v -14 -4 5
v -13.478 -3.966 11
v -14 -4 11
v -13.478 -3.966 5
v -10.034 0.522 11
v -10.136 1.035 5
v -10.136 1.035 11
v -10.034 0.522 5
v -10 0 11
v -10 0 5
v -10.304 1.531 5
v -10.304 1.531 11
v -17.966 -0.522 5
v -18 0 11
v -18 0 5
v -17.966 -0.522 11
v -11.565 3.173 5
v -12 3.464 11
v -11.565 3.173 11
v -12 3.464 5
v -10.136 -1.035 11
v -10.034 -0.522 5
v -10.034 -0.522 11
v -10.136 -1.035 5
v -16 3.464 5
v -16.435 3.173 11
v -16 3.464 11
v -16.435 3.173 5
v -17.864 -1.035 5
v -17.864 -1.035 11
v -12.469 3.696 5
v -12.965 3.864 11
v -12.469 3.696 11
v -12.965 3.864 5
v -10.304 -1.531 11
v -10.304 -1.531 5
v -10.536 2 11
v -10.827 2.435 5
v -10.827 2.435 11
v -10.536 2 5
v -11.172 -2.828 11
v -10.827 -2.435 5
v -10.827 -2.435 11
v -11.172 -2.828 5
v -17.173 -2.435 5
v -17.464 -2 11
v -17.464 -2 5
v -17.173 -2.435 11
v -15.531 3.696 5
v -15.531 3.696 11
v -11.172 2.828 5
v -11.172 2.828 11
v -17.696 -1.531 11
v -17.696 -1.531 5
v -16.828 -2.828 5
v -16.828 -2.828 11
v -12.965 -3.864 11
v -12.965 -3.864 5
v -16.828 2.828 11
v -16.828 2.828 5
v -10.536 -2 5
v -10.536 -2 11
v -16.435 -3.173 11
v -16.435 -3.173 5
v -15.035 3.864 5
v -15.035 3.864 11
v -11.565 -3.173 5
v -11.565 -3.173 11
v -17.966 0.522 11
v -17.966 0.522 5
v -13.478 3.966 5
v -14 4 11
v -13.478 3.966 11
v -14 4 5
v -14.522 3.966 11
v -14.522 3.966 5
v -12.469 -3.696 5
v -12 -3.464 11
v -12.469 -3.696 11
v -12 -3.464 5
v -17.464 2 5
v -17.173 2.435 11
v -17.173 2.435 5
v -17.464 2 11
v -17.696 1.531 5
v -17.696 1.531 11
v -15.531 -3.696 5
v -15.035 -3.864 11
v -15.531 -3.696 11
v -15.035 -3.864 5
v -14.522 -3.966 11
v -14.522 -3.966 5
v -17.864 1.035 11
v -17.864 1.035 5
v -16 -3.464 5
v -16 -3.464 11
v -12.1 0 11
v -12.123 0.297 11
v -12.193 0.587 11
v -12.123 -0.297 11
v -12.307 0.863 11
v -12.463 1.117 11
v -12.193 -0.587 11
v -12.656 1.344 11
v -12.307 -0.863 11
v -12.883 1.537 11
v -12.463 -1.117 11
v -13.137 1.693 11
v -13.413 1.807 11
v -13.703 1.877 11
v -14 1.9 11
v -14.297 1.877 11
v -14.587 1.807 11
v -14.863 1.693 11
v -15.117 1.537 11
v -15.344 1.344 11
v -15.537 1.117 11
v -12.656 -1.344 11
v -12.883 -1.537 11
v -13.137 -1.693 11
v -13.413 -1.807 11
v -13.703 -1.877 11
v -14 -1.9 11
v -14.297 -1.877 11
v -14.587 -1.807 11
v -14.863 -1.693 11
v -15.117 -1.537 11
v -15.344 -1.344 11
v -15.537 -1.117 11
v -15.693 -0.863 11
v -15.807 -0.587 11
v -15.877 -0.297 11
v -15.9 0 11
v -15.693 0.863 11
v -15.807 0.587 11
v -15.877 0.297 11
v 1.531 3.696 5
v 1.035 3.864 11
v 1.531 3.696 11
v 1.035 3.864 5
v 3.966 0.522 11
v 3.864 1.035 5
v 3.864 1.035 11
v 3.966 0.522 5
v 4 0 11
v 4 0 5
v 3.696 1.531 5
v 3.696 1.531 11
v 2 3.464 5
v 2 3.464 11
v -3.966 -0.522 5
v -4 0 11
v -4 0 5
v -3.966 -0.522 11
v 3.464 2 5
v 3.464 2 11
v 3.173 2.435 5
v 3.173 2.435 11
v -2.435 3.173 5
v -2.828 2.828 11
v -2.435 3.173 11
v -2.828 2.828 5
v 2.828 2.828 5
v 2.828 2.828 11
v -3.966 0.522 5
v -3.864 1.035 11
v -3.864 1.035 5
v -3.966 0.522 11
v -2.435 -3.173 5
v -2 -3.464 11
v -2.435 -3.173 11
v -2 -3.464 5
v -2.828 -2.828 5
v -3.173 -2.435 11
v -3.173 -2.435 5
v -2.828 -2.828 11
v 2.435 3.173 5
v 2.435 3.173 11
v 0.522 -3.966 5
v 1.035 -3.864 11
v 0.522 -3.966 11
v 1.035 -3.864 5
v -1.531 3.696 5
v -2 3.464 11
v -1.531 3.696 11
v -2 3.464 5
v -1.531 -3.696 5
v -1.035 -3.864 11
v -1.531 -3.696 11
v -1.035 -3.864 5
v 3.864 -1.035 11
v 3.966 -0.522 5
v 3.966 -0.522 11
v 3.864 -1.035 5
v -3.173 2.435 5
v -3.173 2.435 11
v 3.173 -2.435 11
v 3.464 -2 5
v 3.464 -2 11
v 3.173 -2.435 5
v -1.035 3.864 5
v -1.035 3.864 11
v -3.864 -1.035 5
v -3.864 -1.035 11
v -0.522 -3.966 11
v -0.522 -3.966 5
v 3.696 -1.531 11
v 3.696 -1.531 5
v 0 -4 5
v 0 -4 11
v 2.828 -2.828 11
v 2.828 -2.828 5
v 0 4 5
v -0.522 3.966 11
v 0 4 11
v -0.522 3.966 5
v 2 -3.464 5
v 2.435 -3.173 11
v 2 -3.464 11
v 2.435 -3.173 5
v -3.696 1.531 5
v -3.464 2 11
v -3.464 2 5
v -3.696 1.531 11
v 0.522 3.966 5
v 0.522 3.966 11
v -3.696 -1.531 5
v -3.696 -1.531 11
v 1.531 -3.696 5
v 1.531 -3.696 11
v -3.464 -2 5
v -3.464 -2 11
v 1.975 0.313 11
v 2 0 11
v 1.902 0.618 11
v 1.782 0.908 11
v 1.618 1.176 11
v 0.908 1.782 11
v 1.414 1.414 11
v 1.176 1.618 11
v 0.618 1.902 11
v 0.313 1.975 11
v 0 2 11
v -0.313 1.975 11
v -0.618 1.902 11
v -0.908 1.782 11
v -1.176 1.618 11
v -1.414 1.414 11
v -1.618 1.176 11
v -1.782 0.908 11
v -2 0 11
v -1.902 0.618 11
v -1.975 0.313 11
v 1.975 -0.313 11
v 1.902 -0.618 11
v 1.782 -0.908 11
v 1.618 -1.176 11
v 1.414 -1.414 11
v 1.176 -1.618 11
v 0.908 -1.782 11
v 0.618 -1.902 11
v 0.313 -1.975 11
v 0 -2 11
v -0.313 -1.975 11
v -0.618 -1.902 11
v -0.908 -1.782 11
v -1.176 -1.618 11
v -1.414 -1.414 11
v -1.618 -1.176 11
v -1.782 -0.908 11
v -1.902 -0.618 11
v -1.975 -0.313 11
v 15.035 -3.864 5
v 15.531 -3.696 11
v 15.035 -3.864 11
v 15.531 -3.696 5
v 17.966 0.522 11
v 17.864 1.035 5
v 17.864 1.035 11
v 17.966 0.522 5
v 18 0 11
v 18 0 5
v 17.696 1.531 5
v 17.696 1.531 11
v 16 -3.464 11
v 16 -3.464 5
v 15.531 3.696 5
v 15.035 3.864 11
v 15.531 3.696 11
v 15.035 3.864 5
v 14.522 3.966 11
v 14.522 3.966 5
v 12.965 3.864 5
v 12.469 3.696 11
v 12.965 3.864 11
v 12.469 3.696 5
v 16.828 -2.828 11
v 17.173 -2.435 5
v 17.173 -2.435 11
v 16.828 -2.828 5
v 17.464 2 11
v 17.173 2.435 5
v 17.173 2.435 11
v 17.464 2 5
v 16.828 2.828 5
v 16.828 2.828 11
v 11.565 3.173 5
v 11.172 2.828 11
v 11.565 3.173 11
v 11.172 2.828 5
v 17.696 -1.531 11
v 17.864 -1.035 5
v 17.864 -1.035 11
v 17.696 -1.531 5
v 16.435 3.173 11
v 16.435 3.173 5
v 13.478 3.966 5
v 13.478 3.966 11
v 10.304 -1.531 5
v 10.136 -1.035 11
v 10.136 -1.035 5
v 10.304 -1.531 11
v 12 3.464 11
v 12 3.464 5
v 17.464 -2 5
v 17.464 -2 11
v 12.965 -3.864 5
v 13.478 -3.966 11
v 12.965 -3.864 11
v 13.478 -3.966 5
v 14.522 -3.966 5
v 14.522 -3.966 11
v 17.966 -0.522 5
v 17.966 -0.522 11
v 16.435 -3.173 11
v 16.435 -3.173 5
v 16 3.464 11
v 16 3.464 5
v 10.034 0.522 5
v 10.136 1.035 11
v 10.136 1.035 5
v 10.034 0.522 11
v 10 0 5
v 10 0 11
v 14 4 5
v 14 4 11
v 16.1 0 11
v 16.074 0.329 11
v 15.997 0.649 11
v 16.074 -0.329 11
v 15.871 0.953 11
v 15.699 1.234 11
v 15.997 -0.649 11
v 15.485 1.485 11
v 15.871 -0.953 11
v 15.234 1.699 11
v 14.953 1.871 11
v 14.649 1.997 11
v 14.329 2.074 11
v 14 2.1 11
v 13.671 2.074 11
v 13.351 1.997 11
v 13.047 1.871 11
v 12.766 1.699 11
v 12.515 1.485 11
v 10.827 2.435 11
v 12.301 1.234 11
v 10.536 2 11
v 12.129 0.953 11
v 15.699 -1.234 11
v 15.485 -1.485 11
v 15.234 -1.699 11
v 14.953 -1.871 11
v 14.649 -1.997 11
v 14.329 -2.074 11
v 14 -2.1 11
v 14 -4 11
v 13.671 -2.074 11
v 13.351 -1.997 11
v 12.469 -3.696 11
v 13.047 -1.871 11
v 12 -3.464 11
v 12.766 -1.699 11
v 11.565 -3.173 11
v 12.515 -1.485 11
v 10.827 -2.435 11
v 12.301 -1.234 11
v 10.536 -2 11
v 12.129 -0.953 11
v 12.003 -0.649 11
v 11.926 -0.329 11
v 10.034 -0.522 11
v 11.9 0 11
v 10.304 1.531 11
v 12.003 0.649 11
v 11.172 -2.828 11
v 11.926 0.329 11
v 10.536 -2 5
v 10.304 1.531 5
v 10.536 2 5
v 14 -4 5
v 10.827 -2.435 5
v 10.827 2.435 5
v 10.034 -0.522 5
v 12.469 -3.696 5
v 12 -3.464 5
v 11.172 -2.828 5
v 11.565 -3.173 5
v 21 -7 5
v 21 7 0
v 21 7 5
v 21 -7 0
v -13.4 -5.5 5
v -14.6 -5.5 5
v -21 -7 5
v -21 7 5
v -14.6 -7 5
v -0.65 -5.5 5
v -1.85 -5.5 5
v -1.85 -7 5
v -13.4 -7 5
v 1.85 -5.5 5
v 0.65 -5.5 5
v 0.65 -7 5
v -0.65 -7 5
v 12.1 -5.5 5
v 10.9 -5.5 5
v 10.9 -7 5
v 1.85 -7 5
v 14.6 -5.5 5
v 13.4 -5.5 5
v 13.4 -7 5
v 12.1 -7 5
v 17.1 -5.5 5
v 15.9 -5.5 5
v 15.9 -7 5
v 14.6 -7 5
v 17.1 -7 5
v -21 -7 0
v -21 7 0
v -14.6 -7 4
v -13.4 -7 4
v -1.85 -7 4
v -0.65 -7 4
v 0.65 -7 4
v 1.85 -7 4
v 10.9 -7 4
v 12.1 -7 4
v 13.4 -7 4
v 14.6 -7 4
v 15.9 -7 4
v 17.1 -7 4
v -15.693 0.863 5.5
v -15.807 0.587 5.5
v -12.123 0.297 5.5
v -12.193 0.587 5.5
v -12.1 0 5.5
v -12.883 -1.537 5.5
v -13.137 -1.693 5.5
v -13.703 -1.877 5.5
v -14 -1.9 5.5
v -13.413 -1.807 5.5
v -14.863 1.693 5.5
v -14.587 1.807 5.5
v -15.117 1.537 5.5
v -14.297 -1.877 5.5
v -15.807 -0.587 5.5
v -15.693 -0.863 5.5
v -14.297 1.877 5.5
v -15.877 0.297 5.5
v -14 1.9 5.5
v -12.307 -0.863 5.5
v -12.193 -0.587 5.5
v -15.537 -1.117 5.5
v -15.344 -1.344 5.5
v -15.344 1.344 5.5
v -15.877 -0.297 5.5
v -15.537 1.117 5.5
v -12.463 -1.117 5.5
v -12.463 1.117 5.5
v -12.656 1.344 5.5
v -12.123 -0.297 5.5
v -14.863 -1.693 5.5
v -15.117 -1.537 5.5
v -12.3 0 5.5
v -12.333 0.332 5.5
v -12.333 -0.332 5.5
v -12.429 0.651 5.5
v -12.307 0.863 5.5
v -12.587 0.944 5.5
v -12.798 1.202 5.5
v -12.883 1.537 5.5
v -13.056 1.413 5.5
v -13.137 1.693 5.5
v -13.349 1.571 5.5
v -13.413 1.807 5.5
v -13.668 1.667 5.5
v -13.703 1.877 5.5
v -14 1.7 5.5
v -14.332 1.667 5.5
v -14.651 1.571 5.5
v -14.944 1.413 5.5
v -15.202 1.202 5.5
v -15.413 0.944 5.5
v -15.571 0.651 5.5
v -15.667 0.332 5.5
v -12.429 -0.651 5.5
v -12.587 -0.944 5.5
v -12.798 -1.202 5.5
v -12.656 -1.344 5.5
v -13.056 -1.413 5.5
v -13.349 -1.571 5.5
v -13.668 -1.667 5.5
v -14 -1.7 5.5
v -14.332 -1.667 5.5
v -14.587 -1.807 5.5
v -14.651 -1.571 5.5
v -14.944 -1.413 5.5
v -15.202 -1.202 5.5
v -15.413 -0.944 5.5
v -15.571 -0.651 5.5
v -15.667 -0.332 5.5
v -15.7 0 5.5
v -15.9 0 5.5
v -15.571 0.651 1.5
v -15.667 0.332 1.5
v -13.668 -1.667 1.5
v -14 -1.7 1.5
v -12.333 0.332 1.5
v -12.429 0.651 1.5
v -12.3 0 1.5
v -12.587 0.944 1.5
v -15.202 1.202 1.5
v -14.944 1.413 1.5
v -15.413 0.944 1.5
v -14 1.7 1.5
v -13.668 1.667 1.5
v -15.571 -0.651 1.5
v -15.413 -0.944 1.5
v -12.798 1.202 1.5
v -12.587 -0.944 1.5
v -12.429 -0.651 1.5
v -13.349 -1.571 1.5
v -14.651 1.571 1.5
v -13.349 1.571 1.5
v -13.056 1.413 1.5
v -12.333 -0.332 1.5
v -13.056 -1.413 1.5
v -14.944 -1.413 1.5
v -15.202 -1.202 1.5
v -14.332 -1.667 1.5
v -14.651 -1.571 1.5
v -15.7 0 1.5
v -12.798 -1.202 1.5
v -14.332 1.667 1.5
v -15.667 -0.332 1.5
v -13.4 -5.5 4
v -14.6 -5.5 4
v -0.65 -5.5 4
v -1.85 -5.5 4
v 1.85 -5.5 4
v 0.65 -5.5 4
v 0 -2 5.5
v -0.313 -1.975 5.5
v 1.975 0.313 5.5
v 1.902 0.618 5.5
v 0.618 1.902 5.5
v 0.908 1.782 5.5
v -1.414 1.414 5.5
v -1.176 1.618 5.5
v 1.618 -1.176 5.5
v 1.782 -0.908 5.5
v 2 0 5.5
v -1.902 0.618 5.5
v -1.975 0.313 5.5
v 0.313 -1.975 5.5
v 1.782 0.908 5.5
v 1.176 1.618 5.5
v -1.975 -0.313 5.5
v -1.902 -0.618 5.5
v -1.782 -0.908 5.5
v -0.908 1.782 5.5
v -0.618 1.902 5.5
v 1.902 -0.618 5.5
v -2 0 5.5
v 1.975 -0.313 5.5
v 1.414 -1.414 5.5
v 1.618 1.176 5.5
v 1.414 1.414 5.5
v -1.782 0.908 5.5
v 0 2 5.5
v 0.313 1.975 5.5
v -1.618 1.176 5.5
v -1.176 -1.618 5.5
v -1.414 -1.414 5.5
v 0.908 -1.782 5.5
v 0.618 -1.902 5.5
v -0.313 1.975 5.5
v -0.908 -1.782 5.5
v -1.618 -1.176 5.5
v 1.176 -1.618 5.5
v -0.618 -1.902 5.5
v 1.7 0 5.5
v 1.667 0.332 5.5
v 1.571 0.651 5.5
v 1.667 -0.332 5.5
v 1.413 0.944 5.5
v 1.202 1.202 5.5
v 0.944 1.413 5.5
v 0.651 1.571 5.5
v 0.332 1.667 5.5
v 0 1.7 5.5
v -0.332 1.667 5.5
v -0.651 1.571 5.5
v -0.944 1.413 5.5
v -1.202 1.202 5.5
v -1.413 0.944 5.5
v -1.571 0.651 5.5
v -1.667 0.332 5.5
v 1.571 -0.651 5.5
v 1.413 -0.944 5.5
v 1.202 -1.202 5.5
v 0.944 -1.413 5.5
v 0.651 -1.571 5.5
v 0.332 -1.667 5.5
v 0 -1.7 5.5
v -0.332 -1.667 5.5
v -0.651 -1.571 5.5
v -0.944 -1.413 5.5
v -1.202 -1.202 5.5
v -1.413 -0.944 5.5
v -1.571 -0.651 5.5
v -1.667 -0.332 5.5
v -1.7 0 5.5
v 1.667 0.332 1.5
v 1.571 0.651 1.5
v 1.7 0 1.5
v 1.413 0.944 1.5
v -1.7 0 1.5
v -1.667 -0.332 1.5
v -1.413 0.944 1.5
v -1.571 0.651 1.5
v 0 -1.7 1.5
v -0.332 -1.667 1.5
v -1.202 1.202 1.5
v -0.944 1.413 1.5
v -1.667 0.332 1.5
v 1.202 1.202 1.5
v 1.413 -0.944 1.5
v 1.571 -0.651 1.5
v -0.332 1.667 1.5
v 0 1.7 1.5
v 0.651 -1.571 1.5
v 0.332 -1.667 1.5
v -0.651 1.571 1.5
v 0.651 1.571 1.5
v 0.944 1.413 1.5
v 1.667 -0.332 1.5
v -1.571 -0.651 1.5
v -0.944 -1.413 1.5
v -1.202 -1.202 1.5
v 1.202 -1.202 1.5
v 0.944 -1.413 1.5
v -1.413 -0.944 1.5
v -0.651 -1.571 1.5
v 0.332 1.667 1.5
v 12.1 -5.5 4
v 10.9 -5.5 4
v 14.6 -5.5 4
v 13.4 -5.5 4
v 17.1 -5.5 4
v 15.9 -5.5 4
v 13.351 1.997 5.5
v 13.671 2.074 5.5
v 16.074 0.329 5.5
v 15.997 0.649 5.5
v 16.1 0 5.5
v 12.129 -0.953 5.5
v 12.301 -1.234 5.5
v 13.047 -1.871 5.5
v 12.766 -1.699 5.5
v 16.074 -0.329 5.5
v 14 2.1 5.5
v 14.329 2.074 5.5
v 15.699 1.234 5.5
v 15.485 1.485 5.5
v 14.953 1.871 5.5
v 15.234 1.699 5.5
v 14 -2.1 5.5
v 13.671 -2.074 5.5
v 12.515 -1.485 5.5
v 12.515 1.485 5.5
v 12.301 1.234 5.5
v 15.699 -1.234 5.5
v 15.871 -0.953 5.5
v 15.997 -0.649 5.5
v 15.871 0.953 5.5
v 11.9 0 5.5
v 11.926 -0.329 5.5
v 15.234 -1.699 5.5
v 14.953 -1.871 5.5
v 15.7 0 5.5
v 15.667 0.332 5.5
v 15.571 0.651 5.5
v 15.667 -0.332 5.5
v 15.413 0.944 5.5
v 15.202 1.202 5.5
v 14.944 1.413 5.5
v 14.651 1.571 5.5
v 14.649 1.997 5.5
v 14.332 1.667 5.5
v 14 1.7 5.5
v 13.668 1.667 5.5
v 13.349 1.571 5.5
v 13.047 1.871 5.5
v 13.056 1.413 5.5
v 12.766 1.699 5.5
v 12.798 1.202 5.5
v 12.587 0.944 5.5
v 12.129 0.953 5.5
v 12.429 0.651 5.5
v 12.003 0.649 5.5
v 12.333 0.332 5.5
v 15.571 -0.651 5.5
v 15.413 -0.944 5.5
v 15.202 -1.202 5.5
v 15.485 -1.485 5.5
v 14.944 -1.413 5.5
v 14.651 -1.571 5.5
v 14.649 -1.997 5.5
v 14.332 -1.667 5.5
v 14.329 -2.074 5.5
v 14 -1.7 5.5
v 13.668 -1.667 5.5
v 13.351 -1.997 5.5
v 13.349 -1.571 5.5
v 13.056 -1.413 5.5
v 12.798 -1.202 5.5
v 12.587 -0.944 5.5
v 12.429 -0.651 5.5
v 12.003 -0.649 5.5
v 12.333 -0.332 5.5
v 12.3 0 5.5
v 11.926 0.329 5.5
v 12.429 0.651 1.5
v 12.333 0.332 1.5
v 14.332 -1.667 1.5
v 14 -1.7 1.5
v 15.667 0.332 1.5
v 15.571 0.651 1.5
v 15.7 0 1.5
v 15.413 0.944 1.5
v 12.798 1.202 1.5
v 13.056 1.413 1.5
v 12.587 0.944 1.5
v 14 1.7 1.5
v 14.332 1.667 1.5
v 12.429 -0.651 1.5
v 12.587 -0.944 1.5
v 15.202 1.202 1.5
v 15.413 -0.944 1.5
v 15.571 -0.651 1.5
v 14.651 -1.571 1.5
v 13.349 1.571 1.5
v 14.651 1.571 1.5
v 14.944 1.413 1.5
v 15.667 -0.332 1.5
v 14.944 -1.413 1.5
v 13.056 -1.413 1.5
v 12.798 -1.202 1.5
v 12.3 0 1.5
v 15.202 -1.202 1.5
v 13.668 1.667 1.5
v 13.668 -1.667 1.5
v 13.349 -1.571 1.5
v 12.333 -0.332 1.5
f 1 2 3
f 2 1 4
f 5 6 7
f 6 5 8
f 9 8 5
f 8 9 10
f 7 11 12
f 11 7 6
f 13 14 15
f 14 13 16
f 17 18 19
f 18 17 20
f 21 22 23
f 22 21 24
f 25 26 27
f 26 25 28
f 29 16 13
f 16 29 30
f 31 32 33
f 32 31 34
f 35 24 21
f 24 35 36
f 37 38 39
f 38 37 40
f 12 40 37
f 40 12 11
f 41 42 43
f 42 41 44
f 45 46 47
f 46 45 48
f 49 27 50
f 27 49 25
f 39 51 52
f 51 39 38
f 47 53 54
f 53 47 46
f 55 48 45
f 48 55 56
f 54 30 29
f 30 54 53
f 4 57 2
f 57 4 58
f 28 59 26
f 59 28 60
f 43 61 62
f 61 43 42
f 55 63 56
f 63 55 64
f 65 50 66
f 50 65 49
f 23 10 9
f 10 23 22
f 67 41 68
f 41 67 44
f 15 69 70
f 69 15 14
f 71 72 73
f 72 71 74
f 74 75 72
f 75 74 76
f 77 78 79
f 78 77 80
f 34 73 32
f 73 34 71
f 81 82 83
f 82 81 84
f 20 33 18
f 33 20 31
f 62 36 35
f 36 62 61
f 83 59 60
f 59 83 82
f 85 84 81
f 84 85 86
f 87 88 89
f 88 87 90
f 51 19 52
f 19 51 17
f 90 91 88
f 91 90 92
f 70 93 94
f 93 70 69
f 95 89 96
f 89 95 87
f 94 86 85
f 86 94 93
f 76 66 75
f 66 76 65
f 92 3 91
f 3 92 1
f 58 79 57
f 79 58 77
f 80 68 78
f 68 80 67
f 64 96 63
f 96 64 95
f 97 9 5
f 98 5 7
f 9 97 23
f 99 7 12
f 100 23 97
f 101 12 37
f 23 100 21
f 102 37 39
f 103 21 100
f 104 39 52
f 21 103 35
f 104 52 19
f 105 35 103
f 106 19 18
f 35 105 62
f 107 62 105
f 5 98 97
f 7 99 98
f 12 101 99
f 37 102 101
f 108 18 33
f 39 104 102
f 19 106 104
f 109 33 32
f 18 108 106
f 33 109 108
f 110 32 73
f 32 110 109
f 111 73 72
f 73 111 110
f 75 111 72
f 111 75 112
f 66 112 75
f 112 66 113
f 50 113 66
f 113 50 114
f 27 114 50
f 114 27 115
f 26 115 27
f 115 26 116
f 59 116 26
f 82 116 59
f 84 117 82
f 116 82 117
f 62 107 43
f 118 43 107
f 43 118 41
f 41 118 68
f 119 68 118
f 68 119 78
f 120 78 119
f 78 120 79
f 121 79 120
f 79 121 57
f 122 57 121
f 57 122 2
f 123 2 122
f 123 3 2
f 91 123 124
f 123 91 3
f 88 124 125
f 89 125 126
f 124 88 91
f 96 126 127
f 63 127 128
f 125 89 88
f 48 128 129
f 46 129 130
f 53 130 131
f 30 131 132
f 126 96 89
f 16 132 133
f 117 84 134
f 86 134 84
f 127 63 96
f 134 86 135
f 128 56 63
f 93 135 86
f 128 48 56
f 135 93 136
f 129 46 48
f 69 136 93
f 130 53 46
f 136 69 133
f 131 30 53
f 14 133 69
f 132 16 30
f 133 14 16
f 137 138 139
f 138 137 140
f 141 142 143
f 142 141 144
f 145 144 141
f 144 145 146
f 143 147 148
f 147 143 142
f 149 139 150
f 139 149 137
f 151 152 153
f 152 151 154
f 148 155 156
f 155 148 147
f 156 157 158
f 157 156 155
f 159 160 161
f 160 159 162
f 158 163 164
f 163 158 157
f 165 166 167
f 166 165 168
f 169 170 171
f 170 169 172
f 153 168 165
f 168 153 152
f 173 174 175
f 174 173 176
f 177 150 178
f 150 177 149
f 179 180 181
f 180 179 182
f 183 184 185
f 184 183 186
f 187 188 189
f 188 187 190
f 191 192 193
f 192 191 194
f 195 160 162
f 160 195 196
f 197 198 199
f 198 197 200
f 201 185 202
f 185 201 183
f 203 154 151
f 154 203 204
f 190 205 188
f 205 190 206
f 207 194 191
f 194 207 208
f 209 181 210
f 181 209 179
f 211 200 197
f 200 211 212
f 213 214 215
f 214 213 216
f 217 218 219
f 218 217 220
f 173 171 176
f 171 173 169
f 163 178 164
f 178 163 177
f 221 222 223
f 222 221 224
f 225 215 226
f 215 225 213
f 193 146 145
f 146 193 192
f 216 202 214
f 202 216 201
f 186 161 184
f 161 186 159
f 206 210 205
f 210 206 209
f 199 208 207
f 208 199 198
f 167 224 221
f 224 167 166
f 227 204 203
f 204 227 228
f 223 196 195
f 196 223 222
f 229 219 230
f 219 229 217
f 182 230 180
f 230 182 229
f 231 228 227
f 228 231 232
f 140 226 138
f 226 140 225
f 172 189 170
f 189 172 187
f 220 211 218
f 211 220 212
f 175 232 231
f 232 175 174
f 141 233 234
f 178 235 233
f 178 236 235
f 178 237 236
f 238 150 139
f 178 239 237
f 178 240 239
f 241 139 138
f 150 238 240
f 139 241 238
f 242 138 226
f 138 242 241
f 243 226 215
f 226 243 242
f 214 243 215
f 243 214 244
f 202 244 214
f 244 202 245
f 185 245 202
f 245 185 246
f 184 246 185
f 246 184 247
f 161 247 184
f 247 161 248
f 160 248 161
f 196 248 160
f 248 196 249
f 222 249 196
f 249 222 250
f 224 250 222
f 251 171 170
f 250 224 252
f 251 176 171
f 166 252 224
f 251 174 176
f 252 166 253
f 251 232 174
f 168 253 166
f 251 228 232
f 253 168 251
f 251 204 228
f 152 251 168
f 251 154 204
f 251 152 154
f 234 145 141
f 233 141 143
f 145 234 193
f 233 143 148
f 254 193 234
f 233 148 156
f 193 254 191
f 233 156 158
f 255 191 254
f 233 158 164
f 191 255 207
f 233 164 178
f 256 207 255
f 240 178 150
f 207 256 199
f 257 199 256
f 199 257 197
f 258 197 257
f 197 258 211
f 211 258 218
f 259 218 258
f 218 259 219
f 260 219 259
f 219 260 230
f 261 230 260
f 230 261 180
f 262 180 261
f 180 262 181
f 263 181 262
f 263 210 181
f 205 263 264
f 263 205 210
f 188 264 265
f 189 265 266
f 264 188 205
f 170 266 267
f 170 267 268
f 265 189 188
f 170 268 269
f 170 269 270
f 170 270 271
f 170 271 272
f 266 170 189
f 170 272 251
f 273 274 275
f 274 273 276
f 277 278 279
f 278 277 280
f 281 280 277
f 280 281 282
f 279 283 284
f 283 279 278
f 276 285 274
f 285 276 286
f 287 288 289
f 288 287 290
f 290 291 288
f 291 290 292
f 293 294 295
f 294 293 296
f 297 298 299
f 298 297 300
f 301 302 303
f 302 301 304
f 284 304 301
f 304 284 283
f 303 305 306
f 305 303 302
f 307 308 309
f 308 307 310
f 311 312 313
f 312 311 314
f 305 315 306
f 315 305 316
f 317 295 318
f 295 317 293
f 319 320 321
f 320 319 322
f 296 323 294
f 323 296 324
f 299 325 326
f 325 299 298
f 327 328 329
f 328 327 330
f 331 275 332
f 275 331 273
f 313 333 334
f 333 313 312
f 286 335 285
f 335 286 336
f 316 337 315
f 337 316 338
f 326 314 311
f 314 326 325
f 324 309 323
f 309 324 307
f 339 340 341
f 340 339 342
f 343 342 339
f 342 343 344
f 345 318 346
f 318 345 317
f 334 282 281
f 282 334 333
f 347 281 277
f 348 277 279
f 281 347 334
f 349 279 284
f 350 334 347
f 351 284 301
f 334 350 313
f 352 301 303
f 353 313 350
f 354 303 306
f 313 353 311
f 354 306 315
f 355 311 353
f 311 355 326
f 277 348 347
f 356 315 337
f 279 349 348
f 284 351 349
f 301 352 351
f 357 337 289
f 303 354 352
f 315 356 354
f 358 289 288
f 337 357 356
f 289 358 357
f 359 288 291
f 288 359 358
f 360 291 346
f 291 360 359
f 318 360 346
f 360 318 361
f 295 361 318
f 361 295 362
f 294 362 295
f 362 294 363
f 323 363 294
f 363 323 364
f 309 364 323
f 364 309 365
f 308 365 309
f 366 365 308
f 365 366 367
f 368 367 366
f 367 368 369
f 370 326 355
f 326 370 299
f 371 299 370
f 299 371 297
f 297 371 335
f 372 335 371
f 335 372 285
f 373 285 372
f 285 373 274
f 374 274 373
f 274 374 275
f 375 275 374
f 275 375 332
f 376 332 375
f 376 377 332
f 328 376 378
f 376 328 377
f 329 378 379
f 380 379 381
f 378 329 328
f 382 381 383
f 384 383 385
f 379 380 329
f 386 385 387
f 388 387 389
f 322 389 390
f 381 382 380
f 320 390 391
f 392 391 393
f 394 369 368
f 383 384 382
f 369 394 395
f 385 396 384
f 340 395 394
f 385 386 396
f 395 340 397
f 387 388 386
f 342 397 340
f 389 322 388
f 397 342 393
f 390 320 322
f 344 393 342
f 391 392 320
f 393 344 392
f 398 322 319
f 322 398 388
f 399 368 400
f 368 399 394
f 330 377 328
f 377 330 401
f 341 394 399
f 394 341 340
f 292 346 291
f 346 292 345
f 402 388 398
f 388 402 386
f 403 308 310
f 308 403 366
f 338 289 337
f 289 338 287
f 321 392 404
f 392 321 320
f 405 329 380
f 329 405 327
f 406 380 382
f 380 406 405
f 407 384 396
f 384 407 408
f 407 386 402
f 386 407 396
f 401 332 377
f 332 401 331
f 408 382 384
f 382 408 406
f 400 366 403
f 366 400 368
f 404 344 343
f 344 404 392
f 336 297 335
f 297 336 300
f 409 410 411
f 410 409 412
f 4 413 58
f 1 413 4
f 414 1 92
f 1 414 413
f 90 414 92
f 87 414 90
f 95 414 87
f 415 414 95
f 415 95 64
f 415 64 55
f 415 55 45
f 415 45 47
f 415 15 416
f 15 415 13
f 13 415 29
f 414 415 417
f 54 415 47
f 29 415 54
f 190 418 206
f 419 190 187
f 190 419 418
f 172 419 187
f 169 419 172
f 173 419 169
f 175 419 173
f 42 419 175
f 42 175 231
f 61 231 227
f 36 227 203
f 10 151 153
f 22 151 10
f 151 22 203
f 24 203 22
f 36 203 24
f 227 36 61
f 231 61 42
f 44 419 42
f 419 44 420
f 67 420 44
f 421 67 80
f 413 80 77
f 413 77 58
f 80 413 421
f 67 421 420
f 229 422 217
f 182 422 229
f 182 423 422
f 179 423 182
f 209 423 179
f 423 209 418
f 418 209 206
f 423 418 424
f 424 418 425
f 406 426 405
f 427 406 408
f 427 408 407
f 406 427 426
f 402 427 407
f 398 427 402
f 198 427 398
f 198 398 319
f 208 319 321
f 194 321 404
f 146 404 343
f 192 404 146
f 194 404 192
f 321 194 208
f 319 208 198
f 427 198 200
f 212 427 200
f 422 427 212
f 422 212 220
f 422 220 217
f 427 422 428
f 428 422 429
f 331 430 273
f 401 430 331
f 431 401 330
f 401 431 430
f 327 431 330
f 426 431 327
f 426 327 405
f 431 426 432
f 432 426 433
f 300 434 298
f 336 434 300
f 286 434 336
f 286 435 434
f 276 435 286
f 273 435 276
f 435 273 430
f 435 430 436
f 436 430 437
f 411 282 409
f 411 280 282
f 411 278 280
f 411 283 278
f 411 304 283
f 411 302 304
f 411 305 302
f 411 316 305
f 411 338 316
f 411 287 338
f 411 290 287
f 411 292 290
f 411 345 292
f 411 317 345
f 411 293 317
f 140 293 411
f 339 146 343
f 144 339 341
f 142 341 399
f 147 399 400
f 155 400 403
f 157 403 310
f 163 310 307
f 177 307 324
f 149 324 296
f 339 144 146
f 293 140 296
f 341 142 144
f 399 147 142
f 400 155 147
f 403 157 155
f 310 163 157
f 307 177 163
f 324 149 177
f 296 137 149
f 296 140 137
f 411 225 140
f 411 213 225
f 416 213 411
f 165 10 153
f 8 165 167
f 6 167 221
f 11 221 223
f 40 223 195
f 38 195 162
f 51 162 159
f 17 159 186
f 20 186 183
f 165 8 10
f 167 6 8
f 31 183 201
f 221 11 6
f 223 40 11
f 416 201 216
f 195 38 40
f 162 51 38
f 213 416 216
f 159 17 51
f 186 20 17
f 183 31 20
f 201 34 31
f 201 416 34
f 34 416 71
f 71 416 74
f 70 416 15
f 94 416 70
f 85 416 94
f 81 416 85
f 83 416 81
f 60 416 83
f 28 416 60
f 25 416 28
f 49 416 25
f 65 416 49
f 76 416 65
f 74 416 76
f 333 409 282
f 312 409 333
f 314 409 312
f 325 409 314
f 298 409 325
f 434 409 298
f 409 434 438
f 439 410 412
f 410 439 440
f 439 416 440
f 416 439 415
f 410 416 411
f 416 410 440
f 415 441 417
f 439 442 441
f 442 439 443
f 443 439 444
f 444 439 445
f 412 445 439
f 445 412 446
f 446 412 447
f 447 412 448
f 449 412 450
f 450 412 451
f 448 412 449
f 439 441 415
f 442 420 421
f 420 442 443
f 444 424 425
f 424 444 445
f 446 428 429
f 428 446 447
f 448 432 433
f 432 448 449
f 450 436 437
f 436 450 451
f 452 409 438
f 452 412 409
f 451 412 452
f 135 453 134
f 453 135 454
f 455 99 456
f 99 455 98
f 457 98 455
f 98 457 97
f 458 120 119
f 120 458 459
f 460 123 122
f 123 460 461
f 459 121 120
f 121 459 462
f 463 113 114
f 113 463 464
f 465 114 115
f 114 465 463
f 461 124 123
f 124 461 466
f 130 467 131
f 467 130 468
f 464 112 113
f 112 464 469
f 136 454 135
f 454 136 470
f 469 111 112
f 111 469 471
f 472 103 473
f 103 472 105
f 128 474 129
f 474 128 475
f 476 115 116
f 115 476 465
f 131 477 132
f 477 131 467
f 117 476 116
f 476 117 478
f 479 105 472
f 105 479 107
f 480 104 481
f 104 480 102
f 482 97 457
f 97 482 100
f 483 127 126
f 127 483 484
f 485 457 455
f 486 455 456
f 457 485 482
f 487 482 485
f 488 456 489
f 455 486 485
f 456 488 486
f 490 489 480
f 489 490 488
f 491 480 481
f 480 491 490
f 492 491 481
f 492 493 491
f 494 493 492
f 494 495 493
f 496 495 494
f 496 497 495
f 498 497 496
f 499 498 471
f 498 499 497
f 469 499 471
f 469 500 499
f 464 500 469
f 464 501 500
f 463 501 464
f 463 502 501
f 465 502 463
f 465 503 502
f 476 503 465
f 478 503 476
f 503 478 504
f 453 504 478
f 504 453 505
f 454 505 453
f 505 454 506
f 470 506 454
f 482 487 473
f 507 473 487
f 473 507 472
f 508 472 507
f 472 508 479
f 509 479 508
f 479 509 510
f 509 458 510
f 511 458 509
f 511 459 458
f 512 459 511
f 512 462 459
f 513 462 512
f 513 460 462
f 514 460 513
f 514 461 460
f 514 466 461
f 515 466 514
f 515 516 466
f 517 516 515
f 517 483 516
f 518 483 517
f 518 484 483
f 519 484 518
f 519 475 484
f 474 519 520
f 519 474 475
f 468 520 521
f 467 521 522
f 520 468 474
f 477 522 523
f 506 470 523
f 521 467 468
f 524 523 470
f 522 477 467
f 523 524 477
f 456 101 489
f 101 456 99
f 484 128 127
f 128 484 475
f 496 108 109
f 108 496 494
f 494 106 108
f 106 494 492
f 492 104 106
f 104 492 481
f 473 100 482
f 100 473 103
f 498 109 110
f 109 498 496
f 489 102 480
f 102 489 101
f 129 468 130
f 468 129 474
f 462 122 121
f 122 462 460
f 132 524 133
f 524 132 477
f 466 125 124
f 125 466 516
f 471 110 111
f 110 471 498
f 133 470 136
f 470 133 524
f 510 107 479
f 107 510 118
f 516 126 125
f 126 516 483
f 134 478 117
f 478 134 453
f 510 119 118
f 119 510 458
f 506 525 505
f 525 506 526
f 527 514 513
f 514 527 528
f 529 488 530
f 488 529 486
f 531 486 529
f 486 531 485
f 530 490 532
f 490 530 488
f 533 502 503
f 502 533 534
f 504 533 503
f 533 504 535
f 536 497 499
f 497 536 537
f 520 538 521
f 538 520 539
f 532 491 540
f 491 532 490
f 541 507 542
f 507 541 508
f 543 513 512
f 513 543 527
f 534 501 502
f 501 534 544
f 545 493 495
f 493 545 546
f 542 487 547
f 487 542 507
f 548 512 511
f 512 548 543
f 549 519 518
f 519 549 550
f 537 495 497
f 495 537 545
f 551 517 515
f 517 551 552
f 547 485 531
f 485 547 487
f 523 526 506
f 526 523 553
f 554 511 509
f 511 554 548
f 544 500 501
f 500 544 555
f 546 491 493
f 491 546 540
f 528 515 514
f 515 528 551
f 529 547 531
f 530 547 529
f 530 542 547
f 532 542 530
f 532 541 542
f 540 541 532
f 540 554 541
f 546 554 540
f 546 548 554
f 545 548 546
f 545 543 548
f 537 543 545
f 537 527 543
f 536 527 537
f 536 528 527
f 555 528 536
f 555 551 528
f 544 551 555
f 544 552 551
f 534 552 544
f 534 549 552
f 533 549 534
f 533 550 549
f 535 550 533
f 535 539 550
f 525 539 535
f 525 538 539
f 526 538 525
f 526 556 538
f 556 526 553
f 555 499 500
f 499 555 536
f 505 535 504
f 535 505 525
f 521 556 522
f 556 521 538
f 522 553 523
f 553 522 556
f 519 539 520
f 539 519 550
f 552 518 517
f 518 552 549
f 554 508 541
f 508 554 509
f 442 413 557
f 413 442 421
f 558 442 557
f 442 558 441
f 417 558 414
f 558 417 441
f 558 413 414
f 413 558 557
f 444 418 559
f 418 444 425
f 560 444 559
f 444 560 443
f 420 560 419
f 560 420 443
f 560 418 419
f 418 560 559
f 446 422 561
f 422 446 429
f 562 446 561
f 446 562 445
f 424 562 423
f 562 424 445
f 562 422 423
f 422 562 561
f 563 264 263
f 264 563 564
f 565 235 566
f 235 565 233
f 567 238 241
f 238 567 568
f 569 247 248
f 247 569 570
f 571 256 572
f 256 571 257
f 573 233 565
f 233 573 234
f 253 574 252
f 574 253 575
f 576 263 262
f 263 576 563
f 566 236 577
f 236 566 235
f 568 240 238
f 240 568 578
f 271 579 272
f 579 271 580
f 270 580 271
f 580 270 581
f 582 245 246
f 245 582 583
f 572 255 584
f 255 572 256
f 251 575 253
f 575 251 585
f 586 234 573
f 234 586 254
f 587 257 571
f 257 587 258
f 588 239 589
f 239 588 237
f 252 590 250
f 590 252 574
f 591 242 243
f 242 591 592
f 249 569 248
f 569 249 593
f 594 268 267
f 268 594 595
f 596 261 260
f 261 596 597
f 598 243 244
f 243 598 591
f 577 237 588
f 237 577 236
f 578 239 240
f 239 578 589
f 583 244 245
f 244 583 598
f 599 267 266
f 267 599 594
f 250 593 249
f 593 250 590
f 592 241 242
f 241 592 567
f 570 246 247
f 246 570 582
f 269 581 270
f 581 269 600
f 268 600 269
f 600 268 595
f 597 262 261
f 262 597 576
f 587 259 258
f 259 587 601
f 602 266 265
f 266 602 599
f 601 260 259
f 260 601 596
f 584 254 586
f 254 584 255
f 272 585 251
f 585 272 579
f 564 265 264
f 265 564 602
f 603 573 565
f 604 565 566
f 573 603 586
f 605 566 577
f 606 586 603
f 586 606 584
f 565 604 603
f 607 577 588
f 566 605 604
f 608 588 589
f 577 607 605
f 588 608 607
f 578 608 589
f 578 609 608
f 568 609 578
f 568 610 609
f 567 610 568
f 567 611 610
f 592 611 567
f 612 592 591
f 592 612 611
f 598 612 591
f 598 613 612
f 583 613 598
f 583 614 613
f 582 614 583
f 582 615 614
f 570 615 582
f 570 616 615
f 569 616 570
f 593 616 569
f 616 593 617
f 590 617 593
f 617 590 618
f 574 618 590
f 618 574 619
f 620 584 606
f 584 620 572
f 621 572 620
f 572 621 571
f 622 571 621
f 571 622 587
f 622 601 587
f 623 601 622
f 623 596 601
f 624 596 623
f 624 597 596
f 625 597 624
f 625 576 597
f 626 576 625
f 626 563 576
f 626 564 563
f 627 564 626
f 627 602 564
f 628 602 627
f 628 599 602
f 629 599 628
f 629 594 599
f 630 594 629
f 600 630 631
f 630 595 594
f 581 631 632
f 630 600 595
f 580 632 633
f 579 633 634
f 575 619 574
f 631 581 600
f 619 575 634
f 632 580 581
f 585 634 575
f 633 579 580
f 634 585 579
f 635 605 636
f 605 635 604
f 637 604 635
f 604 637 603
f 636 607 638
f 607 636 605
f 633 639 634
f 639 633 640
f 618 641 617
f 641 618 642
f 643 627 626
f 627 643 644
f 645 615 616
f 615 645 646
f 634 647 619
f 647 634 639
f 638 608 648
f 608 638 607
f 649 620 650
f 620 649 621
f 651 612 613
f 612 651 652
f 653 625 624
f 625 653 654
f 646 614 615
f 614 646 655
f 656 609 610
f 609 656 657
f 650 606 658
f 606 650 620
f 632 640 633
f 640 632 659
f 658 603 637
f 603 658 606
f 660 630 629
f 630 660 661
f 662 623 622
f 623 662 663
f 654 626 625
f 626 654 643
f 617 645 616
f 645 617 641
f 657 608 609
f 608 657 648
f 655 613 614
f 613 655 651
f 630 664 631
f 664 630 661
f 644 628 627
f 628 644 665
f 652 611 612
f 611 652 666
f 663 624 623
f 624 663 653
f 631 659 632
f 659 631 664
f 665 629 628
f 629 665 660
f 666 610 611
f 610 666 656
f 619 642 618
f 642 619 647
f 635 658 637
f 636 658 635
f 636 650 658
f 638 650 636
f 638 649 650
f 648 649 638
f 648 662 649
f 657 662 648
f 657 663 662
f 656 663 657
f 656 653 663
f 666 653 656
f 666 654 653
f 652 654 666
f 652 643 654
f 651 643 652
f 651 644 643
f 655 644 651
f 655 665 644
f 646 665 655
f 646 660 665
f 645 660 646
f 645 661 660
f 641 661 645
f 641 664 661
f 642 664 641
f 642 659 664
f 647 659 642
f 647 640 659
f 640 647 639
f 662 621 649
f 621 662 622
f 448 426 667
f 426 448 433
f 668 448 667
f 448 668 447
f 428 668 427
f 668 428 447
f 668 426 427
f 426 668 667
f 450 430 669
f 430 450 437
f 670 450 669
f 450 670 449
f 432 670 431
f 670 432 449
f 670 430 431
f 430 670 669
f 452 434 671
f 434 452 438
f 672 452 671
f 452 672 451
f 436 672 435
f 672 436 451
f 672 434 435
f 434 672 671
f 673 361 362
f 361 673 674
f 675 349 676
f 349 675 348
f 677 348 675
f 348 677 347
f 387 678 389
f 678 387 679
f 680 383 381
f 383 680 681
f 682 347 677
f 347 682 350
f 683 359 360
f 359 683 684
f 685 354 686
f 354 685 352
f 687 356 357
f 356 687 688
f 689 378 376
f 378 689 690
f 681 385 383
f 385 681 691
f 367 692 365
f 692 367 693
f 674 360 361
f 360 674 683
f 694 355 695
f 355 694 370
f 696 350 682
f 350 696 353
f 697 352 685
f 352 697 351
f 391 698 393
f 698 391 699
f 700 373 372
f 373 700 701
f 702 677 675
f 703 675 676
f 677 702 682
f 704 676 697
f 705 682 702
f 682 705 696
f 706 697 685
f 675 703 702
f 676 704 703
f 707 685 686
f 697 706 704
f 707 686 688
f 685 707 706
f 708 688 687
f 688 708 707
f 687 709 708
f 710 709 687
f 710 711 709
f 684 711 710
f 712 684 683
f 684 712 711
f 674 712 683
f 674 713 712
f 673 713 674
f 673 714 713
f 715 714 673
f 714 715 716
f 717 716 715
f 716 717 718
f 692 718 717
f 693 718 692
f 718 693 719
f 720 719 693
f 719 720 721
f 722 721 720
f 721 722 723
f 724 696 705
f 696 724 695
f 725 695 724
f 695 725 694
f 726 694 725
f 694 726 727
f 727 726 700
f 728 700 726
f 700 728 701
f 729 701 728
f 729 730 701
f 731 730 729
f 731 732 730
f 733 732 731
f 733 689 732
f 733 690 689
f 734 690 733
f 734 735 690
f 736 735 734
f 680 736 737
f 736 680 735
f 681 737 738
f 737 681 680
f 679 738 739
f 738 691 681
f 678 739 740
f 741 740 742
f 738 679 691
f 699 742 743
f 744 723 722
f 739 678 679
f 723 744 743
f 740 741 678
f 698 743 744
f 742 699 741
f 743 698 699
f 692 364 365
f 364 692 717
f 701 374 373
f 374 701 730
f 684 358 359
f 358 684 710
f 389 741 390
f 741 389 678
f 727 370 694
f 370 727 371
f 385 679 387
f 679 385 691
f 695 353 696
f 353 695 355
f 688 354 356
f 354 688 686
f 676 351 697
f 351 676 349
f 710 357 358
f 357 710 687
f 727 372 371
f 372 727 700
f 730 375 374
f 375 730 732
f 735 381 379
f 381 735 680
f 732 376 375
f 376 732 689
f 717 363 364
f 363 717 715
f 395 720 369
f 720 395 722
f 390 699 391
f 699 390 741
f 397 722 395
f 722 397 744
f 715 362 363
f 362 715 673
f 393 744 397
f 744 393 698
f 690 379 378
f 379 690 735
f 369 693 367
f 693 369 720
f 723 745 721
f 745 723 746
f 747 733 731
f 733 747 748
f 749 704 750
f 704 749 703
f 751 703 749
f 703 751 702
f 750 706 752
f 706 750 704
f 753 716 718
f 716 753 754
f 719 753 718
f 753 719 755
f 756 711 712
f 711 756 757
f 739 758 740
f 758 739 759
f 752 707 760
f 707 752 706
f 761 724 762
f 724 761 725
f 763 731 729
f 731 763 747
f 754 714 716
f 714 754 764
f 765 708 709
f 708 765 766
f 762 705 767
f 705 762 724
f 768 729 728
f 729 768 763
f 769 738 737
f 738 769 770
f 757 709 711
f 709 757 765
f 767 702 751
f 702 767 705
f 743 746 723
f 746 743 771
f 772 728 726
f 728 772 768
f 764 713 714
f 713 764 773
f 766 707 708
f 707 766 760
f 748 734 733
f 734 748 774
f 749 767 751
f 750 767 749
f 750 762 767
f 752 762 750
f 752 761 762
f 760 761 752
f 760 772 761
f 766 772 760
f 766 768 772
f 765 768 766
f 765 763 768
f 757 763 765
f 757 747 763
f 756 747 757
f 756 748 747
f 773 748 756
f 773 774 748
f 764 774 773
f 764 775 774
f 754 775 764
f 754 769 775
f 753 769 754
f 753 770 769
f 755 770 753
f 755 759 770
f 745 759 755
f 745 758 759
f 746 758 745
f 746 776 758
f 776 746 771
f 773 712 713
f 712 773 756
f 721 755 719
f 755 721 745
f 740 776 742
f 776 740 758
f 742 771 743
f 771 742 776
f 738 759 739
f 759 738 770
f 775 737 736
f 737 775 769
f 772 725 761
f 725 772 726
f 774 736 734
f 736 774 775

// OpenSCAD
// insert_coupon — one printable part (see dial_unit_housing.scad section 9)
//   openscad -o insert_coupon.stl print_insert_coupon.scad
use <dial_unit_housing.scad>
print_insert_coupon();
